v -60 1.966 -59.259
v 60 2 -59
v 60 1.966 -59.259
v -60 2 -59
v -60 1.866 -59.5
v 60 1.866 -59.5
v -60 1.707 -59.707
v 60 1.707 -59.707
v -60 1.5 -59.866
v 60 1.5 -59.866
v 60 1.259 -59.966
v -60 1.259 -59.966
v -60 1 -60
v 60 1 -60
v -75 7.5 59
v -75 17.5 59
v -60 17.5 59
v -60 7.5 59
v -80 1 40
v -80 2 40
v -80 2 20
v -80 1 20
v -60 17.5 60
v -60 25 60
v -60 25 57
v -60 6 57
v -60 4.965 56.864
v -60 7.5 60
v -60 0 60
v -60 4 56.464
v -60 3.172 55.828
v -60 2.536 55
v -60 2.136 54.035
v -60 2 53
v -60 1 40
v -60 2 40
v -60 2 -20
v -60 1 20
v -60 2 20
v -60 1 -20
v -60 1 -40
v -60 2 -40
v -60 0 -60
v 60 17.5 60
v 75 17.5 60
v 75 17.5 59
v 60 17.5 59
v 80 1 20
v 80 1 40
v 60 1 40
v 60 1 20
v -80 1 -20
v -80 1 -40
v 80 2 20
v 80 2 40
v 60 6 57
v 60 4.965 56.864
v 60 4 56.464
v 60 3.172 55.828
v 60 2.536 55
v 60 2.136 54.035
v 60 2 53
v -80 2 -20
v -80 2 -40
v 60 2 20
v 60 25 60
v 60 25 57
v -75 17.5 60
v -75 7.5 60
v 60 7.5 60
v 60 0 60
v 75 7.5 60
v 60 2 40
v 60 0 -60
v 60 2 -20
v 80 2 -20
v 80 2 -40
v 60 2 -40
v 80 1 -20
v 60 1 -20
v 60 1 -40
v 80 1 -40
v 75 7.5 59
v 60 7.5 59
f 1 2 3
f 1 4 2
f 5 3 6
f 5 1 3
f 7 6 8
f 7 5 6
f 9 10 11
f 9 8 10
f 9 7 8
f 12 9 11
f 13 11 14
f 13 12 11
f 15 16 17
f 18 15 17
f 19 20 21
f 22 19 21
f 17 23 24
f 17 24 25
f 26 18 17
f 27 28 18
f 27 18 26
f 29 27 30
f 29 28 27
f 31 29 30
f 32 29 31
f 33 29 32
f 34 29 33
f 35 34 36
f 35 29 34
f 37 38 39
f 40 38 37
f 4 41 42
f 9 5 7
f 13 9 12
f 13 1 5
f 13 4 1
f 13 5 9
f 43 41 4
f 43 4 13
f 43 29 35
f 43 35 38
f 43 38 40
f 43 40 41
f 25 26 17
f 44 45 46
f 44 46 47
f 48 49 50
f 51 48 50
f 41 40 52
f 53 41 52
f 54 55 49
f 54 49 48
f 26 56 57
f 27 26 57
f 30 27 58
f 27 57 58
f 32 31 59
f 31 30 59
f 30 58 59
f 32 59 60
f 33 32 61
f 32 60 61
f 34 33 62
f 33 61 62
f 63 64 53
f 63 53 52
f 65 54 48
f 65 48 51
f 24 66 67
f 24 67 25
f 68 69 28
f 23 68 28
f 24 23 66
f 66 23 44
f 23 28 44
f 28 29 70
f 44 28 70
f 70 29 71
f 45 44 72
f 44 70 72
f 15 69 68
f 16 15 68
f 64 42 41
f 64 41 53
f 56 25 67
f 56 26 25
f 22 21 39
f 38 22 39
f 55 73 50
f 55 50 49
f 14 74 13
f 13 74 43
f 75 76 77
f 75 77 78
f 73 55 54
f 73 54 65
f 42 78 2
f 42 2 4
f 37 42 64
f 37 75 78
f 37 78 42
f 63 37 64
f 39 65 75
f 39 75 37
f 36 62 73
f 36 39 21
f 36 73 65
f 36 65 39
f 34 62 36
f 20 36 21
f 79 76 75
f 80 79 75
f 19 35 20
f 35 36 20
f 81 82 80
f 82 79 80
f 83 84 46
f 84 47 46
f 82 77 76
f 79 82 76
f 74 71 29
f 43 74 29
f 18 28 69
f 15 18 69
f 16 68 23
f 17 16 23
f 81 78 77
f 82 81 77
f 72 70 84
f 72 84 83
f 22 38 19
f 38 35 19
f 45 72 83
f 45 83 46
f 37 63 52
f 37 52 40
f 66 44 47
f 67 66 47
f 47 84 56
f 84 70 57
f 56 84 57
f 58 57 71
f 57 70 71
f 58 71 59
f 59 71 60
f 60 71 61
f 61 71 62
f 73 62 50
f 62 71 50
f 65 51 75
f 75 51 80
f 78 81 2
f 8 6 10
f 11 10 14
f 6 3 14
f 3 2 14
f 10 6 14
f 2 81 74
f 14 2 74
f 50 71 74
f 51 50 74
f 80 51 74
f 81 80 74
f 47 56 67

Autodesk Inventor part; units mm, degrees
ref_plane "YZ Plane" through (0, 0, 0) normal (1, 0, 0) x (0, 1, 0)
ref_plane "XZ Plane" through (0, 0, 0) normal (0, 1, 0) x (-1, 0, 0)
ref_plane "XY Plane" through (0, 0, 0) normal (0, 0, 1) x (1, 0, 0)
sketch "スケッチ1" plane through (0, 0, 0) normal (0, 1, 0) x (-1, 0, 0)
  line L0 (180, 60) -> (-180, 60)
  line L1 (-180, 60) -> (-180, -60)
  line L2 (-180, -60) -> (180, -60)
  line L3 (180, -60) -> (180, 60)
  line L4 (180, 60) -> (-180, -60) construction
  line L5 (-180, 60) -> (180, -60) construction
  line L6 (180, 57) -> (-180, 57)
  line L7 (-60, 60) -> (-60, -60)
  line L8 (-60, 40) -> (-80, 40)
  line L9 (-80, 40) -> (-80, 20)
  line L10 (-80, 20) -> (-60, 20)
  line L11 (252, 0) -> (-252, 0) construction
  line L12 (-60, -40) -> (-80, -40)
  line L13 (-80, -40) -> (-80, -20)
  line L14 (-80, -20) -> (-60, -20)
  line L15 (0, -84) -> (0, 84) construction
  line L16 (60, 60) -> (60, -60)
  line L17 (60, 40) -> (80, 40)
  line L18 (80, 40) -> (80, 20)
  line L19 (80, 20) -> (60, 20)
  line L20 (60, -40) -> (80, -40)
  line L21 (80, -20) -> (60, -20)
  line L22 (80, -40) -> (80, -20)
  line L23 (-60, 19.7) -> (-80.3, 19.7)
  line L24 (-80.3, 19.7) -> (-80.3, 40.3)
  line L25 (-80.3, 40.3) -> (-60, 40.3)
  line L26 (-60, -19.7) -> (-80.3, -19.7)
  line L27 (-80.3, -19.7) -> (-80.3, -40.3)
  line L28 (-80.3, -40.3) -> (-60, -40.3)
  line L29 (60, 19.7) -> (80.3, 19.7)
  line L30 (80.3, 19.7) -> (80.3, 40.3)
  line L31 (80.3, 40.3) -> (60, 40.3)
  line L32 (60, -19.7) -> (80.3, -19.7)
  line L33 (80.3, -19.7) -> (80.3, -40.3)
  line L34 (80.3, -40.3) -> (60, -40.3)
  point P0 (0, 0)
  point P1 (60, 57)
  point P2 (-60, 57)
  dimension "d0" = 120
  dimension "d1" = 360
  dimension "d4" = 3
  dimension "d5" = 120
  dimension "d7" = 20
  dimension "d8" = 20
  dimension "d9" = 20
  dimension "d10" = 0.3
  dimension "d11" = 0.3
extrude "押し出し3" add sketch "スケッチ1" along normal blind 25 contours L3 L6 L16 L0 | L16 L6 L7 L0 | L7 L6 L1 L0
sketch "スケッチ2" plane through (-180, 0, 60) normal (0, 0, 1) x (1, 0, 0)
  line L0 (0, 0) -> (360, 0) projected
  line L1 (360, 0) -> (360, 25) projected
  line L2 (0, 25) -> (360, 25) projected
  line L3 (0, 0) -> (0, 25) projected
  line L4 (240, 0) -> (240, 25)
  line L5 (240, 7.5) -> (255, 7.5)
  line L6 (255, 7.5) -> (255, 17.5)
  line L7 (255, 17.5) -> (240, 17.5)
  line L8 (180, -5) -> (180, 30) construction
  line L9 (120, 0) -> (120, 25)
  line L10 (120, 7.5) -> (105, 7.5)
  line L11 (105, 7.5) -> (105, 17.5)
  line L12 (105, 17.5) -> (120, 17.5)
  line L13 (240, 17.9) -> (255.4, 17.9)
  line L14 (255.4, 17.9) -> (255.4, 7.1)
  line L15 (255.4, 7.1) -> (240, 7.1)
  line L16 (120, 17.9) -> (104.6, 17.9)
  line L17 (104.6, 17.9) -> (104.6, 7.1)
  line L18 (104.6, 7.1) -> (120, 7.1)
  point P0 (180, 0)
  point P1 (360, 12.5)
  dimension "d16" = 120
  dimension "d17" = 10
  dimension "d18" = 15
  dimension "d19" = 7.5
  dimension "d24" = 0.4
extrude "押し出し6" add sketch "スケッチ1" along normal blind 2 contours L16 L2 L7 L6
extrude "押し出し7" add sketch "スケッチ1" against normal blind 1 from surface at 2 contours L17 L18 L19 L16 | L7 L10 L9 L8 | L16 L21 L22 L20 | L12 L13 L14 L7
extrude "押し出し8" cut sketch "スケッチ2" against normal up to surface (3 mm away) contours L3 L2 L9 L16 L17 L18 L0 | L4 L15 L14 L13 L2 L1 L0 | L18 L17 L16 L9 L12 L11 L10 | L4 L5 L6 L7 L13 L14 L15 | L10 L11 L12 L9 | L4 L7 L6 L5
fillet "フィレット2" radius 1 1 edges at (0, 2, -60)
extrude "押し出し9" add sketch "スケッチ2" against normal blind 1 contours L10 L11 L12 L9 | L4 L7 L6 L5
fillet "フィレット3" radius 4 1 edges at (0, 2, 57)
properties part number "protectar1"
